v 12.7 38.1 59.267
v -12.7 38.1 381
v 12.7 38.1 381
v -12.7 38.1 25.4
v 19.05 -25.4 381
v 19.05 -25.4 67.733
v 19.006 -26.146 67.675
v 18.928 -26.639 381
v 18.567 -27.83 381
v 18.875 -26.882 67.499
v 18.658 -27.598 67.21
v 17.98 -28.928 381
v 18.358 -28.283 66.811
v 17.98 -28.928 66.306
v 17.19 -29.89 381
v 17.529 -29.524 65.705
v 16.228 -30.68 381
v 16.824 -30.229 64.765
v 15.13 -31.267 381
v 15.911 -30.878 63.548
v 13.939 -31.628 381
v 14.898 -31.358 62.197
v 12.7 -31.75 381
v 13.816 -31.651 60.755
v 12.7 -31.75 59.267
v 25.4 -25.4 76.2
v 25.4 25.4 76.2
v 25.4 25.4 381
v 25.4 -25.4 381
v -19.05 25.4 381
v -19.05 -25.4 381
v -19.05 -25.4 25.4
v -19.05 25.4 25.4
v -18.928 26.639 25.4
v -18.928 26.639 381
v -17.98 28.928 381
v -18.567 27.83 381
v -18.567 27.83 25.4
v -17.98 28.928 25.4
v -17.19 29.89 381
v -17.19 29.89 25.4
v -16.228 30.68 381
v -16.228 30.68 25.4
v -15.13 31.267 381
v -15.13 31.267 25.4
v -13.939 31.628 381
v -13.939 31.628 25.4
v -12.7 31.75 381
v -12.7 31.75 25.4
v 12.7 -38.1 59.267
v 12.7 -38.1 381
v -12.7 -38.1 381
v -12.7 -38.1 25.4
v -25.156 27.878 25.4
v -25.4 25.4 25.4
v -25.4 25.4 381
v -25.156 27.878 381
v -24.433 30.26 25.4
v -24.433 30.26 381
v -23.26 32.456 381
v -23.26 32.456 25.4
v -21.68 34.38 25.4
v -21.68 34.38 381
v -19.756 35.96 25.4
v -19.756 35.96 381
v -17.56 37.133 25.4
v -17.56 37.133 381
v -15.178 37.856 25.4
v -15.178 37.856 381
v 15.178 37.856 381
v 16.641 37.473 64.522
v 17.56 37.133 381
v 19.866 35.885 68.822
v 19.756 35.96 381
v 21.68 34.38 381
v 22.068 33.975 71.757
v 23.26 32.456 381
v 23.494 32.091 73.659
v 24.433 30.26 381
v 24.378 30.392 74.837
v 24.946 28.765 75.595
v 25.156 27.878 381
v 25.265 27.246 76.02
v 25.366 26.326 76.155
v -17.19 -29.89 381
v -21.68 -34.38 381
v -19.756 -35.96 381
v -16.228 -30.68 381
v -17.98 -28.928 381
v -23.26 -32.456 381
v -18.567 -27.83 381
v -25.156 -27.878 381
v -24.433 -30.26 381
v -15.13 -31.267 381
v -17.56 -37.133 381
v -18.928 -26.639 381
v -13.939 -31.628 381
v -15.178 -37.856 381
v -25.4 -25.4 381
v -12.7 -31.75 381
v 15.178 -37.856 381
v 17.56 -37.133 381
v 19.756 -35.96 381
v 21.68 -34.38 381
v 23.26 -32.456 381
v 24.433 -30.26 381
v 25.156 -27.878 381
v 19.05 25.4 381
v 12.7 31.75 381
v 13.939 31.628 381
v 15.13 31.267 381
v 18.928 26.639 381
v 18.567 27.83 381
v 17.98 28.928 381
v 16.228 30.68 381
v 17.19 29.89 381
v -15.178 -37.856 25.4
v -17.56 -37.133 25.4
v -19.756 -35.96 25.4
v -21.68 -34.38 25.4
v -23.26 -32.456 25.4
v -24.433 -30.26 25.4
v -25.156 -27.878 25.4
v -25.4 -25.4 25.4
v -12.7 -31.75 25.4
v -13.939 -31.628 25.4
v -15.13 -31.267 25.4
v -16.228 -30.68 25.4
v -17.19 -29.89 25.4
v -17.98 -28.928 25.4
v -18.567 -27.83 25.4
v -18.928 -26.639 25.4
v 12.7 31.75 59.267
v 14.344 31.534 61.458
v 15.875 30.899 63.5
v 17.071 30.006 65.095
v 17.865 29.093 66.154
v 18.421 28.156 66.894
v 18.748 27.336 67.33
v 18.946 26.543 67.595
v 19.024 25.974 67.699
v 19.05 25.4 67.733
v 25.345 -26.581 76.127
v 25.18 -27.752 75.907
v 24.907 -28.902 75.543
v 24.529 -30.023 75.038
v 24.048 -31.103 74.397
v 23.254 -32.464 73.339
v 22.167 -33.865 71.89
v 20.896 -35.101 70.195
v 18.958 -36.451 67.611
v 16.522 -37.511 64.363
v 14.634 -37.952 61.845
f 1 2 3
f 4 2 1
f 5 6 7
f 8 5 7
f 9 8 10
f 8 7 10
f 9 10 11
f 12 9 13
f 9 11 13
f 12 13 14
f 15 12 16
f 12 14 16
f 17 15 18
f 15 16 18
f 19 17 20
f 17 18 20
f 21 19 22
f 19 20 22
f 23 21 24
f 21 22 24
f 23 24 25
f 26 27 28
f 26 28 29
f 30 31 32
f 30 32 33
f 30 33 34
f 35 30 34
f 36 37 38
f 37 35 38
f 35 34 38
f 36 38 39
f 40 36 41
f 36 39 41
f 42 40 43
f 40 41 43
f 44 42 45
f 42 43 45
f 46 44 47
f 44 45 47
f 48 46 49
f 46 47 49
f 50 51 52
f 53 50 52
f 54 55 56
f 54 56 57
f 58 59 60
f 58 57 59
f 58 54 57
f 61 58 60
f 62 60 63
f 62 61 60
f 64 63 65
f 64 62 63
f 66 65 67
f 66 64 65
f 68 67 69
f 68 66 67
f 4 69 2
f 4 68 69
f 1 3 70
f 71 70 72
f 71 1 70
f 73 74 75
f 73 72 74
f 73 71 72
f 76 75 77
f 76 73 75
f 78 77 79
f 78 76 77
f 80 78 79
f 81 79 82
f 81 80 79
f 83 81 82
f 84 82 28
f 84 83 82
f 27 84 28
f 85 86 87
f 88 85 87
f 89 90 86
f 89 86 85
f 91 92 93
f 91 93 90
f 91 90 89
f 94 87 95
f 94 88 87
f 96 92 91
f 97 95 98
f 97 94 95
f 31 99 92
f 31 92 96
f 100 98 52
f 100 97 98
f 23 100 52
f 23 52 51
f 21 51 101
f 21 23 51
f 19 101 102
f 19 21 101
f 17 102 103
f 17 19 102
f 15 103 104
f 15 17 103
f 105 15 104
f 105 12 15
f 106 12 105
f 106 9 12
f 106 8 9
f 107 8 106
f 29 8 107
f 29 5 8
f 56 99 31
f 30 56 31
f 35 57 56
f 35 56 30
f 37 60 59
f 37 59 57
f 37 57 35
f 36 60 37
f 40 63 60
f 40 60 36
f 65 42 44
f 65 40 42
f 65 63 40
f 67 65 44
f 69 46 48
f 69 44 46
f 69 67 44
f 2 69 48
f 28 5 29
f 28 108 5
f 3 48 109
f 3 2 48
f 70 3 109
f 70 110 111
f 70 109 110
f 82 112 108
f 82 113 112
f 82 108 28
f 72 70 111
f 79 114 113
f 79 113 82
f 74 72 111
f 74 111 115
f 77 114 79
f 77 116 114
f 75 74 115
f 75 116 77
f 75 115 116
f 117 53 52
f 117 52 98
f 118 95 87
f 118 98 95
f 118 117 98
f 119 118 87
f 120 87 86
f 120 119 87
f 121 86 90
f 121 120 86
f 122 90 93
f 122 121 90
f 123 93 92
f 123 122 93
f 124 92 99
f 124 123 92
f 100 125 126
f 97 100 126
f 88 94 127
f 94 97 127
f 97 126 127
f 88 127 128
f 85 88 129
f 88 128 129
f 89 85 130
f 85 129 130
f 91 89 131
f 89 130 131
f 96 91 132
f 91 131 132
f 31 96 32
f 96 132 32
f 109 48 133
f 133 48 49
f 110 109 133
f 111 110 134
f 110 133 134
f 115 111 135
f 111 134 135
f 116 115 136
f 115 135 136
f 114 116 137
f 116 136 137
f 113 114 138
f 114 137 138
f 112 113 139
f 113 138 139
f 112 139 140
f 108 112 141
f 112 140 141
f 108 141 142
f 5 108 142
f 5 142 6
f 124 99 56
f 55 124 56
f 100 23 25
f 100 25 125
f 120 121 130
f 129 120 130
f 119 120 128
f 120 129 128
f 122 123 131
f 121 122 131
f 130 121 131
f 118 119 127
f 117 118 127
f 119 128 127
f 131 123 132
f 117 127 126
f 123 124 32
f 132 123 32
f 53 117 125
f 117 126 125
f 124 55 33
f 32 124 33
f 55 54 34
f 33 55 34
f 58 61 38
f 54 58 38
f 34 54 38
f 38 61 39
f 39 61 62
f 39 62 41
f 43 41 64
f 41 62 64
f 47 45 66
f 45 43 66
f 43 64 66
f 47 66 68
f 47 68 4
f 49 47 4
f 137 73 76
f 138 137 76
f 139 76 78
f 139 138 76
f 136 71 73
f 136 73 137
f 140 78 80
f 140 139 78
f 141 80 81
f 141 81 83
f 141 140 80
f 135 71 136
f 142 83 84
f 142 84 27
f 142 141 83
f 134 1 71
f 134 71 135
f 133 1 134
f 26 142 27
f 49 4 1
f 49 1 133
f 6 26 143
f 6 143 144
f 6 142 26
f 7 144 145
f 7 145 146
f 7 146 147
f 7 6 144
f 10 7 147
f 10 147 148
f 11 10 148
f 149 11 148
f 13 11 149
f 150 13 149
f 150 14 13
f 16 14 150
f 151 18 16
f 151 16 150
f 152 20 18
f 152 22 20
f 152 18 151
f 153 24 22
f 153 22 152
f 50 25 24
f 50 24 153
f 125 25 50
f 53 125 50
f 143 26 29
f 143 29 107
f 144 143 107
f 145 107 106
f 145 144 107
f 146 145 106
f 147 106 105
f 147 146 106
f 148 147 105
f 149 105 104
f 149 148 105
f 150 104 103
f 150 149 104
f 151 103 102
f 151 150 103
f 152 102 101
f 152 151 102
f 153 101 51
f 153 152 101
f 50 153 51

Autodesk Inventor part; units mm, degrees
ref_plane "Start Plane" through (0, 0, 25.4) normal (0, 0, 1) x (1, 0, 0)
ref_plane "End Plane" through (0, 0, 381) normal (0, 0, 1) x (1, 0, 0)
sketch "Sketch" plane through (0, 0, 0) normal (0, 0, 1) x (1, 0, 0)
  line L0 (-25.4, -25.4) -> (-25.4, 25.4)
  line L1 (-12.7, 38.1) -> (12.7, 38.1)
  line L2 (25.4, 25.4) -> (25.4, -25.4)
  line L3 (12.7, -38.1) -> (-12.7, -38.1)
  arc A0 (-25.4, -25.4) -> (-12.7, -38.1) centre (-12.7, -25.4) ccw
  arc A1 (-12.7, 38.1) -> (-25.4, 25.4) centre (-12.7, 25.4) ccw
  arc A2 (25.4, 25.4) -> (12.7, 38.1) centre (12.7, 25.4) ccw
  arc A3 (12.7, -38.1) -> (25.4, -25.4) centre (12.7, -25.4) ccw
  arc A4 (-12.7, 31.75) -> (-19.05, 25.4) centre (-12.7, 25.4) ccw
  line L4 (-12.7, 31.75) -> (12.7, 31.75)
  arc A5 (19.05, 25.4) -> (12.7, 31.75) centre (12.7, 25.4) ccw
  line L5 (19.05, 25.4) -> (19.05, -25.4)
  arc A6 (12.7, -31.75) -> (19.05, -25.4) centre (12.7, -25.4) ccw
  line L6 (12.7, -31.75) -> (-12.7, -31.75)
  arc A7 (-19.05, -25.4) -> (-12.7, -31.75) centre (-12.7, -25.4) ccw
  line L7 (-19.05, -25.4) -> (-19.05, 25.4)
  line L8 (0, 57.0224) -> (0, -57.0224) construction
  line L9 (-39.2424, 0) -> (39.2424, 0) construction
  dimension "d10" = 76.2
  dimension "d11" = 50.8
  dimension "d12" = 6.35
  dimension "d15" = 38.1
  dimension "d16" = 25.4
  dimension "d17" = 12.7
extrude "Body" add sketch "Sketch" along normal up to surface (355.6 mm away) from surface at 25.4
sketch "Sketch3" plane through (0, 0, 0) normal (0, 0, 1) x (1, 0, 0)
  line L0 (0, 0) -> (10, 0)
ref_plane "Work Plane3" through (0, 0, 0) normal (0, -1, 0) x (1, 0, 0)
ref_plane "Work Plane4" through (304.8, -25.4, 381) normal (0, 0, 1) x (1, 0, 0)
split "Split1" plane through (304.8, -25.4, 381) removes the side toward (0, 0, 1)
ref_plane "Work Plane5" through (-609.6, -25.4, 25.4) normal (0, 0, -1) x (-1, 0, 0)
split "Split2" plane through (-609.6, -25.4, 25.4) removes the side toward (0, 0, -1)
ref_plane "Work Plane6" through (-20.32, -25.4, 15.24) normal (0.8, 0, -0.6) x (-0.6, 0, -0.8)
split "Split3" plane through (-20.32, -25.4, 15.24) removes the side toward (0.8, 0, -0.6)
sketch "Sketch4" plane through (0, 0, 0) normal (0, -1, 0) x (1, 0, 0)
  line L0 (-2, 25.4) -> (12, 25.4) projected
  line L1 (-2, 381) -> (12, 381) projected
  dimension "d19" = 355.6
equation "\"d10\" = G_H"
equation "\"d11\" = G_W"
equation "\"d12\" = G_T"
equation "\"d15\" = 0.5 * d10"
equation "\"d16\" = 0.5 * d11"
equation "\"d17\" = G_IR"
equation "\"d3\" = G_L"
equation "\"G_W\" = 50.8"
equation "\"G_H\" = 76.2"
equation "\"G_T\" = 6.35"
equation "\"G_IR\" = 12.7"
equation "\"G_L\" = d19"
equation "\"G_OFFSET_START\" = -25.4"
equation "\"G_OFFSET_END\" = -25.4"
equation "\"d13\" = -G_OFFSET_START"
equation "\"d14\" = G_OFFSET_END + B_L"
equation "\"B_L\" = 406.4"
properties part number "AISC - 3 x 2 x 1/4 - 14" material "Steel, Mild"
